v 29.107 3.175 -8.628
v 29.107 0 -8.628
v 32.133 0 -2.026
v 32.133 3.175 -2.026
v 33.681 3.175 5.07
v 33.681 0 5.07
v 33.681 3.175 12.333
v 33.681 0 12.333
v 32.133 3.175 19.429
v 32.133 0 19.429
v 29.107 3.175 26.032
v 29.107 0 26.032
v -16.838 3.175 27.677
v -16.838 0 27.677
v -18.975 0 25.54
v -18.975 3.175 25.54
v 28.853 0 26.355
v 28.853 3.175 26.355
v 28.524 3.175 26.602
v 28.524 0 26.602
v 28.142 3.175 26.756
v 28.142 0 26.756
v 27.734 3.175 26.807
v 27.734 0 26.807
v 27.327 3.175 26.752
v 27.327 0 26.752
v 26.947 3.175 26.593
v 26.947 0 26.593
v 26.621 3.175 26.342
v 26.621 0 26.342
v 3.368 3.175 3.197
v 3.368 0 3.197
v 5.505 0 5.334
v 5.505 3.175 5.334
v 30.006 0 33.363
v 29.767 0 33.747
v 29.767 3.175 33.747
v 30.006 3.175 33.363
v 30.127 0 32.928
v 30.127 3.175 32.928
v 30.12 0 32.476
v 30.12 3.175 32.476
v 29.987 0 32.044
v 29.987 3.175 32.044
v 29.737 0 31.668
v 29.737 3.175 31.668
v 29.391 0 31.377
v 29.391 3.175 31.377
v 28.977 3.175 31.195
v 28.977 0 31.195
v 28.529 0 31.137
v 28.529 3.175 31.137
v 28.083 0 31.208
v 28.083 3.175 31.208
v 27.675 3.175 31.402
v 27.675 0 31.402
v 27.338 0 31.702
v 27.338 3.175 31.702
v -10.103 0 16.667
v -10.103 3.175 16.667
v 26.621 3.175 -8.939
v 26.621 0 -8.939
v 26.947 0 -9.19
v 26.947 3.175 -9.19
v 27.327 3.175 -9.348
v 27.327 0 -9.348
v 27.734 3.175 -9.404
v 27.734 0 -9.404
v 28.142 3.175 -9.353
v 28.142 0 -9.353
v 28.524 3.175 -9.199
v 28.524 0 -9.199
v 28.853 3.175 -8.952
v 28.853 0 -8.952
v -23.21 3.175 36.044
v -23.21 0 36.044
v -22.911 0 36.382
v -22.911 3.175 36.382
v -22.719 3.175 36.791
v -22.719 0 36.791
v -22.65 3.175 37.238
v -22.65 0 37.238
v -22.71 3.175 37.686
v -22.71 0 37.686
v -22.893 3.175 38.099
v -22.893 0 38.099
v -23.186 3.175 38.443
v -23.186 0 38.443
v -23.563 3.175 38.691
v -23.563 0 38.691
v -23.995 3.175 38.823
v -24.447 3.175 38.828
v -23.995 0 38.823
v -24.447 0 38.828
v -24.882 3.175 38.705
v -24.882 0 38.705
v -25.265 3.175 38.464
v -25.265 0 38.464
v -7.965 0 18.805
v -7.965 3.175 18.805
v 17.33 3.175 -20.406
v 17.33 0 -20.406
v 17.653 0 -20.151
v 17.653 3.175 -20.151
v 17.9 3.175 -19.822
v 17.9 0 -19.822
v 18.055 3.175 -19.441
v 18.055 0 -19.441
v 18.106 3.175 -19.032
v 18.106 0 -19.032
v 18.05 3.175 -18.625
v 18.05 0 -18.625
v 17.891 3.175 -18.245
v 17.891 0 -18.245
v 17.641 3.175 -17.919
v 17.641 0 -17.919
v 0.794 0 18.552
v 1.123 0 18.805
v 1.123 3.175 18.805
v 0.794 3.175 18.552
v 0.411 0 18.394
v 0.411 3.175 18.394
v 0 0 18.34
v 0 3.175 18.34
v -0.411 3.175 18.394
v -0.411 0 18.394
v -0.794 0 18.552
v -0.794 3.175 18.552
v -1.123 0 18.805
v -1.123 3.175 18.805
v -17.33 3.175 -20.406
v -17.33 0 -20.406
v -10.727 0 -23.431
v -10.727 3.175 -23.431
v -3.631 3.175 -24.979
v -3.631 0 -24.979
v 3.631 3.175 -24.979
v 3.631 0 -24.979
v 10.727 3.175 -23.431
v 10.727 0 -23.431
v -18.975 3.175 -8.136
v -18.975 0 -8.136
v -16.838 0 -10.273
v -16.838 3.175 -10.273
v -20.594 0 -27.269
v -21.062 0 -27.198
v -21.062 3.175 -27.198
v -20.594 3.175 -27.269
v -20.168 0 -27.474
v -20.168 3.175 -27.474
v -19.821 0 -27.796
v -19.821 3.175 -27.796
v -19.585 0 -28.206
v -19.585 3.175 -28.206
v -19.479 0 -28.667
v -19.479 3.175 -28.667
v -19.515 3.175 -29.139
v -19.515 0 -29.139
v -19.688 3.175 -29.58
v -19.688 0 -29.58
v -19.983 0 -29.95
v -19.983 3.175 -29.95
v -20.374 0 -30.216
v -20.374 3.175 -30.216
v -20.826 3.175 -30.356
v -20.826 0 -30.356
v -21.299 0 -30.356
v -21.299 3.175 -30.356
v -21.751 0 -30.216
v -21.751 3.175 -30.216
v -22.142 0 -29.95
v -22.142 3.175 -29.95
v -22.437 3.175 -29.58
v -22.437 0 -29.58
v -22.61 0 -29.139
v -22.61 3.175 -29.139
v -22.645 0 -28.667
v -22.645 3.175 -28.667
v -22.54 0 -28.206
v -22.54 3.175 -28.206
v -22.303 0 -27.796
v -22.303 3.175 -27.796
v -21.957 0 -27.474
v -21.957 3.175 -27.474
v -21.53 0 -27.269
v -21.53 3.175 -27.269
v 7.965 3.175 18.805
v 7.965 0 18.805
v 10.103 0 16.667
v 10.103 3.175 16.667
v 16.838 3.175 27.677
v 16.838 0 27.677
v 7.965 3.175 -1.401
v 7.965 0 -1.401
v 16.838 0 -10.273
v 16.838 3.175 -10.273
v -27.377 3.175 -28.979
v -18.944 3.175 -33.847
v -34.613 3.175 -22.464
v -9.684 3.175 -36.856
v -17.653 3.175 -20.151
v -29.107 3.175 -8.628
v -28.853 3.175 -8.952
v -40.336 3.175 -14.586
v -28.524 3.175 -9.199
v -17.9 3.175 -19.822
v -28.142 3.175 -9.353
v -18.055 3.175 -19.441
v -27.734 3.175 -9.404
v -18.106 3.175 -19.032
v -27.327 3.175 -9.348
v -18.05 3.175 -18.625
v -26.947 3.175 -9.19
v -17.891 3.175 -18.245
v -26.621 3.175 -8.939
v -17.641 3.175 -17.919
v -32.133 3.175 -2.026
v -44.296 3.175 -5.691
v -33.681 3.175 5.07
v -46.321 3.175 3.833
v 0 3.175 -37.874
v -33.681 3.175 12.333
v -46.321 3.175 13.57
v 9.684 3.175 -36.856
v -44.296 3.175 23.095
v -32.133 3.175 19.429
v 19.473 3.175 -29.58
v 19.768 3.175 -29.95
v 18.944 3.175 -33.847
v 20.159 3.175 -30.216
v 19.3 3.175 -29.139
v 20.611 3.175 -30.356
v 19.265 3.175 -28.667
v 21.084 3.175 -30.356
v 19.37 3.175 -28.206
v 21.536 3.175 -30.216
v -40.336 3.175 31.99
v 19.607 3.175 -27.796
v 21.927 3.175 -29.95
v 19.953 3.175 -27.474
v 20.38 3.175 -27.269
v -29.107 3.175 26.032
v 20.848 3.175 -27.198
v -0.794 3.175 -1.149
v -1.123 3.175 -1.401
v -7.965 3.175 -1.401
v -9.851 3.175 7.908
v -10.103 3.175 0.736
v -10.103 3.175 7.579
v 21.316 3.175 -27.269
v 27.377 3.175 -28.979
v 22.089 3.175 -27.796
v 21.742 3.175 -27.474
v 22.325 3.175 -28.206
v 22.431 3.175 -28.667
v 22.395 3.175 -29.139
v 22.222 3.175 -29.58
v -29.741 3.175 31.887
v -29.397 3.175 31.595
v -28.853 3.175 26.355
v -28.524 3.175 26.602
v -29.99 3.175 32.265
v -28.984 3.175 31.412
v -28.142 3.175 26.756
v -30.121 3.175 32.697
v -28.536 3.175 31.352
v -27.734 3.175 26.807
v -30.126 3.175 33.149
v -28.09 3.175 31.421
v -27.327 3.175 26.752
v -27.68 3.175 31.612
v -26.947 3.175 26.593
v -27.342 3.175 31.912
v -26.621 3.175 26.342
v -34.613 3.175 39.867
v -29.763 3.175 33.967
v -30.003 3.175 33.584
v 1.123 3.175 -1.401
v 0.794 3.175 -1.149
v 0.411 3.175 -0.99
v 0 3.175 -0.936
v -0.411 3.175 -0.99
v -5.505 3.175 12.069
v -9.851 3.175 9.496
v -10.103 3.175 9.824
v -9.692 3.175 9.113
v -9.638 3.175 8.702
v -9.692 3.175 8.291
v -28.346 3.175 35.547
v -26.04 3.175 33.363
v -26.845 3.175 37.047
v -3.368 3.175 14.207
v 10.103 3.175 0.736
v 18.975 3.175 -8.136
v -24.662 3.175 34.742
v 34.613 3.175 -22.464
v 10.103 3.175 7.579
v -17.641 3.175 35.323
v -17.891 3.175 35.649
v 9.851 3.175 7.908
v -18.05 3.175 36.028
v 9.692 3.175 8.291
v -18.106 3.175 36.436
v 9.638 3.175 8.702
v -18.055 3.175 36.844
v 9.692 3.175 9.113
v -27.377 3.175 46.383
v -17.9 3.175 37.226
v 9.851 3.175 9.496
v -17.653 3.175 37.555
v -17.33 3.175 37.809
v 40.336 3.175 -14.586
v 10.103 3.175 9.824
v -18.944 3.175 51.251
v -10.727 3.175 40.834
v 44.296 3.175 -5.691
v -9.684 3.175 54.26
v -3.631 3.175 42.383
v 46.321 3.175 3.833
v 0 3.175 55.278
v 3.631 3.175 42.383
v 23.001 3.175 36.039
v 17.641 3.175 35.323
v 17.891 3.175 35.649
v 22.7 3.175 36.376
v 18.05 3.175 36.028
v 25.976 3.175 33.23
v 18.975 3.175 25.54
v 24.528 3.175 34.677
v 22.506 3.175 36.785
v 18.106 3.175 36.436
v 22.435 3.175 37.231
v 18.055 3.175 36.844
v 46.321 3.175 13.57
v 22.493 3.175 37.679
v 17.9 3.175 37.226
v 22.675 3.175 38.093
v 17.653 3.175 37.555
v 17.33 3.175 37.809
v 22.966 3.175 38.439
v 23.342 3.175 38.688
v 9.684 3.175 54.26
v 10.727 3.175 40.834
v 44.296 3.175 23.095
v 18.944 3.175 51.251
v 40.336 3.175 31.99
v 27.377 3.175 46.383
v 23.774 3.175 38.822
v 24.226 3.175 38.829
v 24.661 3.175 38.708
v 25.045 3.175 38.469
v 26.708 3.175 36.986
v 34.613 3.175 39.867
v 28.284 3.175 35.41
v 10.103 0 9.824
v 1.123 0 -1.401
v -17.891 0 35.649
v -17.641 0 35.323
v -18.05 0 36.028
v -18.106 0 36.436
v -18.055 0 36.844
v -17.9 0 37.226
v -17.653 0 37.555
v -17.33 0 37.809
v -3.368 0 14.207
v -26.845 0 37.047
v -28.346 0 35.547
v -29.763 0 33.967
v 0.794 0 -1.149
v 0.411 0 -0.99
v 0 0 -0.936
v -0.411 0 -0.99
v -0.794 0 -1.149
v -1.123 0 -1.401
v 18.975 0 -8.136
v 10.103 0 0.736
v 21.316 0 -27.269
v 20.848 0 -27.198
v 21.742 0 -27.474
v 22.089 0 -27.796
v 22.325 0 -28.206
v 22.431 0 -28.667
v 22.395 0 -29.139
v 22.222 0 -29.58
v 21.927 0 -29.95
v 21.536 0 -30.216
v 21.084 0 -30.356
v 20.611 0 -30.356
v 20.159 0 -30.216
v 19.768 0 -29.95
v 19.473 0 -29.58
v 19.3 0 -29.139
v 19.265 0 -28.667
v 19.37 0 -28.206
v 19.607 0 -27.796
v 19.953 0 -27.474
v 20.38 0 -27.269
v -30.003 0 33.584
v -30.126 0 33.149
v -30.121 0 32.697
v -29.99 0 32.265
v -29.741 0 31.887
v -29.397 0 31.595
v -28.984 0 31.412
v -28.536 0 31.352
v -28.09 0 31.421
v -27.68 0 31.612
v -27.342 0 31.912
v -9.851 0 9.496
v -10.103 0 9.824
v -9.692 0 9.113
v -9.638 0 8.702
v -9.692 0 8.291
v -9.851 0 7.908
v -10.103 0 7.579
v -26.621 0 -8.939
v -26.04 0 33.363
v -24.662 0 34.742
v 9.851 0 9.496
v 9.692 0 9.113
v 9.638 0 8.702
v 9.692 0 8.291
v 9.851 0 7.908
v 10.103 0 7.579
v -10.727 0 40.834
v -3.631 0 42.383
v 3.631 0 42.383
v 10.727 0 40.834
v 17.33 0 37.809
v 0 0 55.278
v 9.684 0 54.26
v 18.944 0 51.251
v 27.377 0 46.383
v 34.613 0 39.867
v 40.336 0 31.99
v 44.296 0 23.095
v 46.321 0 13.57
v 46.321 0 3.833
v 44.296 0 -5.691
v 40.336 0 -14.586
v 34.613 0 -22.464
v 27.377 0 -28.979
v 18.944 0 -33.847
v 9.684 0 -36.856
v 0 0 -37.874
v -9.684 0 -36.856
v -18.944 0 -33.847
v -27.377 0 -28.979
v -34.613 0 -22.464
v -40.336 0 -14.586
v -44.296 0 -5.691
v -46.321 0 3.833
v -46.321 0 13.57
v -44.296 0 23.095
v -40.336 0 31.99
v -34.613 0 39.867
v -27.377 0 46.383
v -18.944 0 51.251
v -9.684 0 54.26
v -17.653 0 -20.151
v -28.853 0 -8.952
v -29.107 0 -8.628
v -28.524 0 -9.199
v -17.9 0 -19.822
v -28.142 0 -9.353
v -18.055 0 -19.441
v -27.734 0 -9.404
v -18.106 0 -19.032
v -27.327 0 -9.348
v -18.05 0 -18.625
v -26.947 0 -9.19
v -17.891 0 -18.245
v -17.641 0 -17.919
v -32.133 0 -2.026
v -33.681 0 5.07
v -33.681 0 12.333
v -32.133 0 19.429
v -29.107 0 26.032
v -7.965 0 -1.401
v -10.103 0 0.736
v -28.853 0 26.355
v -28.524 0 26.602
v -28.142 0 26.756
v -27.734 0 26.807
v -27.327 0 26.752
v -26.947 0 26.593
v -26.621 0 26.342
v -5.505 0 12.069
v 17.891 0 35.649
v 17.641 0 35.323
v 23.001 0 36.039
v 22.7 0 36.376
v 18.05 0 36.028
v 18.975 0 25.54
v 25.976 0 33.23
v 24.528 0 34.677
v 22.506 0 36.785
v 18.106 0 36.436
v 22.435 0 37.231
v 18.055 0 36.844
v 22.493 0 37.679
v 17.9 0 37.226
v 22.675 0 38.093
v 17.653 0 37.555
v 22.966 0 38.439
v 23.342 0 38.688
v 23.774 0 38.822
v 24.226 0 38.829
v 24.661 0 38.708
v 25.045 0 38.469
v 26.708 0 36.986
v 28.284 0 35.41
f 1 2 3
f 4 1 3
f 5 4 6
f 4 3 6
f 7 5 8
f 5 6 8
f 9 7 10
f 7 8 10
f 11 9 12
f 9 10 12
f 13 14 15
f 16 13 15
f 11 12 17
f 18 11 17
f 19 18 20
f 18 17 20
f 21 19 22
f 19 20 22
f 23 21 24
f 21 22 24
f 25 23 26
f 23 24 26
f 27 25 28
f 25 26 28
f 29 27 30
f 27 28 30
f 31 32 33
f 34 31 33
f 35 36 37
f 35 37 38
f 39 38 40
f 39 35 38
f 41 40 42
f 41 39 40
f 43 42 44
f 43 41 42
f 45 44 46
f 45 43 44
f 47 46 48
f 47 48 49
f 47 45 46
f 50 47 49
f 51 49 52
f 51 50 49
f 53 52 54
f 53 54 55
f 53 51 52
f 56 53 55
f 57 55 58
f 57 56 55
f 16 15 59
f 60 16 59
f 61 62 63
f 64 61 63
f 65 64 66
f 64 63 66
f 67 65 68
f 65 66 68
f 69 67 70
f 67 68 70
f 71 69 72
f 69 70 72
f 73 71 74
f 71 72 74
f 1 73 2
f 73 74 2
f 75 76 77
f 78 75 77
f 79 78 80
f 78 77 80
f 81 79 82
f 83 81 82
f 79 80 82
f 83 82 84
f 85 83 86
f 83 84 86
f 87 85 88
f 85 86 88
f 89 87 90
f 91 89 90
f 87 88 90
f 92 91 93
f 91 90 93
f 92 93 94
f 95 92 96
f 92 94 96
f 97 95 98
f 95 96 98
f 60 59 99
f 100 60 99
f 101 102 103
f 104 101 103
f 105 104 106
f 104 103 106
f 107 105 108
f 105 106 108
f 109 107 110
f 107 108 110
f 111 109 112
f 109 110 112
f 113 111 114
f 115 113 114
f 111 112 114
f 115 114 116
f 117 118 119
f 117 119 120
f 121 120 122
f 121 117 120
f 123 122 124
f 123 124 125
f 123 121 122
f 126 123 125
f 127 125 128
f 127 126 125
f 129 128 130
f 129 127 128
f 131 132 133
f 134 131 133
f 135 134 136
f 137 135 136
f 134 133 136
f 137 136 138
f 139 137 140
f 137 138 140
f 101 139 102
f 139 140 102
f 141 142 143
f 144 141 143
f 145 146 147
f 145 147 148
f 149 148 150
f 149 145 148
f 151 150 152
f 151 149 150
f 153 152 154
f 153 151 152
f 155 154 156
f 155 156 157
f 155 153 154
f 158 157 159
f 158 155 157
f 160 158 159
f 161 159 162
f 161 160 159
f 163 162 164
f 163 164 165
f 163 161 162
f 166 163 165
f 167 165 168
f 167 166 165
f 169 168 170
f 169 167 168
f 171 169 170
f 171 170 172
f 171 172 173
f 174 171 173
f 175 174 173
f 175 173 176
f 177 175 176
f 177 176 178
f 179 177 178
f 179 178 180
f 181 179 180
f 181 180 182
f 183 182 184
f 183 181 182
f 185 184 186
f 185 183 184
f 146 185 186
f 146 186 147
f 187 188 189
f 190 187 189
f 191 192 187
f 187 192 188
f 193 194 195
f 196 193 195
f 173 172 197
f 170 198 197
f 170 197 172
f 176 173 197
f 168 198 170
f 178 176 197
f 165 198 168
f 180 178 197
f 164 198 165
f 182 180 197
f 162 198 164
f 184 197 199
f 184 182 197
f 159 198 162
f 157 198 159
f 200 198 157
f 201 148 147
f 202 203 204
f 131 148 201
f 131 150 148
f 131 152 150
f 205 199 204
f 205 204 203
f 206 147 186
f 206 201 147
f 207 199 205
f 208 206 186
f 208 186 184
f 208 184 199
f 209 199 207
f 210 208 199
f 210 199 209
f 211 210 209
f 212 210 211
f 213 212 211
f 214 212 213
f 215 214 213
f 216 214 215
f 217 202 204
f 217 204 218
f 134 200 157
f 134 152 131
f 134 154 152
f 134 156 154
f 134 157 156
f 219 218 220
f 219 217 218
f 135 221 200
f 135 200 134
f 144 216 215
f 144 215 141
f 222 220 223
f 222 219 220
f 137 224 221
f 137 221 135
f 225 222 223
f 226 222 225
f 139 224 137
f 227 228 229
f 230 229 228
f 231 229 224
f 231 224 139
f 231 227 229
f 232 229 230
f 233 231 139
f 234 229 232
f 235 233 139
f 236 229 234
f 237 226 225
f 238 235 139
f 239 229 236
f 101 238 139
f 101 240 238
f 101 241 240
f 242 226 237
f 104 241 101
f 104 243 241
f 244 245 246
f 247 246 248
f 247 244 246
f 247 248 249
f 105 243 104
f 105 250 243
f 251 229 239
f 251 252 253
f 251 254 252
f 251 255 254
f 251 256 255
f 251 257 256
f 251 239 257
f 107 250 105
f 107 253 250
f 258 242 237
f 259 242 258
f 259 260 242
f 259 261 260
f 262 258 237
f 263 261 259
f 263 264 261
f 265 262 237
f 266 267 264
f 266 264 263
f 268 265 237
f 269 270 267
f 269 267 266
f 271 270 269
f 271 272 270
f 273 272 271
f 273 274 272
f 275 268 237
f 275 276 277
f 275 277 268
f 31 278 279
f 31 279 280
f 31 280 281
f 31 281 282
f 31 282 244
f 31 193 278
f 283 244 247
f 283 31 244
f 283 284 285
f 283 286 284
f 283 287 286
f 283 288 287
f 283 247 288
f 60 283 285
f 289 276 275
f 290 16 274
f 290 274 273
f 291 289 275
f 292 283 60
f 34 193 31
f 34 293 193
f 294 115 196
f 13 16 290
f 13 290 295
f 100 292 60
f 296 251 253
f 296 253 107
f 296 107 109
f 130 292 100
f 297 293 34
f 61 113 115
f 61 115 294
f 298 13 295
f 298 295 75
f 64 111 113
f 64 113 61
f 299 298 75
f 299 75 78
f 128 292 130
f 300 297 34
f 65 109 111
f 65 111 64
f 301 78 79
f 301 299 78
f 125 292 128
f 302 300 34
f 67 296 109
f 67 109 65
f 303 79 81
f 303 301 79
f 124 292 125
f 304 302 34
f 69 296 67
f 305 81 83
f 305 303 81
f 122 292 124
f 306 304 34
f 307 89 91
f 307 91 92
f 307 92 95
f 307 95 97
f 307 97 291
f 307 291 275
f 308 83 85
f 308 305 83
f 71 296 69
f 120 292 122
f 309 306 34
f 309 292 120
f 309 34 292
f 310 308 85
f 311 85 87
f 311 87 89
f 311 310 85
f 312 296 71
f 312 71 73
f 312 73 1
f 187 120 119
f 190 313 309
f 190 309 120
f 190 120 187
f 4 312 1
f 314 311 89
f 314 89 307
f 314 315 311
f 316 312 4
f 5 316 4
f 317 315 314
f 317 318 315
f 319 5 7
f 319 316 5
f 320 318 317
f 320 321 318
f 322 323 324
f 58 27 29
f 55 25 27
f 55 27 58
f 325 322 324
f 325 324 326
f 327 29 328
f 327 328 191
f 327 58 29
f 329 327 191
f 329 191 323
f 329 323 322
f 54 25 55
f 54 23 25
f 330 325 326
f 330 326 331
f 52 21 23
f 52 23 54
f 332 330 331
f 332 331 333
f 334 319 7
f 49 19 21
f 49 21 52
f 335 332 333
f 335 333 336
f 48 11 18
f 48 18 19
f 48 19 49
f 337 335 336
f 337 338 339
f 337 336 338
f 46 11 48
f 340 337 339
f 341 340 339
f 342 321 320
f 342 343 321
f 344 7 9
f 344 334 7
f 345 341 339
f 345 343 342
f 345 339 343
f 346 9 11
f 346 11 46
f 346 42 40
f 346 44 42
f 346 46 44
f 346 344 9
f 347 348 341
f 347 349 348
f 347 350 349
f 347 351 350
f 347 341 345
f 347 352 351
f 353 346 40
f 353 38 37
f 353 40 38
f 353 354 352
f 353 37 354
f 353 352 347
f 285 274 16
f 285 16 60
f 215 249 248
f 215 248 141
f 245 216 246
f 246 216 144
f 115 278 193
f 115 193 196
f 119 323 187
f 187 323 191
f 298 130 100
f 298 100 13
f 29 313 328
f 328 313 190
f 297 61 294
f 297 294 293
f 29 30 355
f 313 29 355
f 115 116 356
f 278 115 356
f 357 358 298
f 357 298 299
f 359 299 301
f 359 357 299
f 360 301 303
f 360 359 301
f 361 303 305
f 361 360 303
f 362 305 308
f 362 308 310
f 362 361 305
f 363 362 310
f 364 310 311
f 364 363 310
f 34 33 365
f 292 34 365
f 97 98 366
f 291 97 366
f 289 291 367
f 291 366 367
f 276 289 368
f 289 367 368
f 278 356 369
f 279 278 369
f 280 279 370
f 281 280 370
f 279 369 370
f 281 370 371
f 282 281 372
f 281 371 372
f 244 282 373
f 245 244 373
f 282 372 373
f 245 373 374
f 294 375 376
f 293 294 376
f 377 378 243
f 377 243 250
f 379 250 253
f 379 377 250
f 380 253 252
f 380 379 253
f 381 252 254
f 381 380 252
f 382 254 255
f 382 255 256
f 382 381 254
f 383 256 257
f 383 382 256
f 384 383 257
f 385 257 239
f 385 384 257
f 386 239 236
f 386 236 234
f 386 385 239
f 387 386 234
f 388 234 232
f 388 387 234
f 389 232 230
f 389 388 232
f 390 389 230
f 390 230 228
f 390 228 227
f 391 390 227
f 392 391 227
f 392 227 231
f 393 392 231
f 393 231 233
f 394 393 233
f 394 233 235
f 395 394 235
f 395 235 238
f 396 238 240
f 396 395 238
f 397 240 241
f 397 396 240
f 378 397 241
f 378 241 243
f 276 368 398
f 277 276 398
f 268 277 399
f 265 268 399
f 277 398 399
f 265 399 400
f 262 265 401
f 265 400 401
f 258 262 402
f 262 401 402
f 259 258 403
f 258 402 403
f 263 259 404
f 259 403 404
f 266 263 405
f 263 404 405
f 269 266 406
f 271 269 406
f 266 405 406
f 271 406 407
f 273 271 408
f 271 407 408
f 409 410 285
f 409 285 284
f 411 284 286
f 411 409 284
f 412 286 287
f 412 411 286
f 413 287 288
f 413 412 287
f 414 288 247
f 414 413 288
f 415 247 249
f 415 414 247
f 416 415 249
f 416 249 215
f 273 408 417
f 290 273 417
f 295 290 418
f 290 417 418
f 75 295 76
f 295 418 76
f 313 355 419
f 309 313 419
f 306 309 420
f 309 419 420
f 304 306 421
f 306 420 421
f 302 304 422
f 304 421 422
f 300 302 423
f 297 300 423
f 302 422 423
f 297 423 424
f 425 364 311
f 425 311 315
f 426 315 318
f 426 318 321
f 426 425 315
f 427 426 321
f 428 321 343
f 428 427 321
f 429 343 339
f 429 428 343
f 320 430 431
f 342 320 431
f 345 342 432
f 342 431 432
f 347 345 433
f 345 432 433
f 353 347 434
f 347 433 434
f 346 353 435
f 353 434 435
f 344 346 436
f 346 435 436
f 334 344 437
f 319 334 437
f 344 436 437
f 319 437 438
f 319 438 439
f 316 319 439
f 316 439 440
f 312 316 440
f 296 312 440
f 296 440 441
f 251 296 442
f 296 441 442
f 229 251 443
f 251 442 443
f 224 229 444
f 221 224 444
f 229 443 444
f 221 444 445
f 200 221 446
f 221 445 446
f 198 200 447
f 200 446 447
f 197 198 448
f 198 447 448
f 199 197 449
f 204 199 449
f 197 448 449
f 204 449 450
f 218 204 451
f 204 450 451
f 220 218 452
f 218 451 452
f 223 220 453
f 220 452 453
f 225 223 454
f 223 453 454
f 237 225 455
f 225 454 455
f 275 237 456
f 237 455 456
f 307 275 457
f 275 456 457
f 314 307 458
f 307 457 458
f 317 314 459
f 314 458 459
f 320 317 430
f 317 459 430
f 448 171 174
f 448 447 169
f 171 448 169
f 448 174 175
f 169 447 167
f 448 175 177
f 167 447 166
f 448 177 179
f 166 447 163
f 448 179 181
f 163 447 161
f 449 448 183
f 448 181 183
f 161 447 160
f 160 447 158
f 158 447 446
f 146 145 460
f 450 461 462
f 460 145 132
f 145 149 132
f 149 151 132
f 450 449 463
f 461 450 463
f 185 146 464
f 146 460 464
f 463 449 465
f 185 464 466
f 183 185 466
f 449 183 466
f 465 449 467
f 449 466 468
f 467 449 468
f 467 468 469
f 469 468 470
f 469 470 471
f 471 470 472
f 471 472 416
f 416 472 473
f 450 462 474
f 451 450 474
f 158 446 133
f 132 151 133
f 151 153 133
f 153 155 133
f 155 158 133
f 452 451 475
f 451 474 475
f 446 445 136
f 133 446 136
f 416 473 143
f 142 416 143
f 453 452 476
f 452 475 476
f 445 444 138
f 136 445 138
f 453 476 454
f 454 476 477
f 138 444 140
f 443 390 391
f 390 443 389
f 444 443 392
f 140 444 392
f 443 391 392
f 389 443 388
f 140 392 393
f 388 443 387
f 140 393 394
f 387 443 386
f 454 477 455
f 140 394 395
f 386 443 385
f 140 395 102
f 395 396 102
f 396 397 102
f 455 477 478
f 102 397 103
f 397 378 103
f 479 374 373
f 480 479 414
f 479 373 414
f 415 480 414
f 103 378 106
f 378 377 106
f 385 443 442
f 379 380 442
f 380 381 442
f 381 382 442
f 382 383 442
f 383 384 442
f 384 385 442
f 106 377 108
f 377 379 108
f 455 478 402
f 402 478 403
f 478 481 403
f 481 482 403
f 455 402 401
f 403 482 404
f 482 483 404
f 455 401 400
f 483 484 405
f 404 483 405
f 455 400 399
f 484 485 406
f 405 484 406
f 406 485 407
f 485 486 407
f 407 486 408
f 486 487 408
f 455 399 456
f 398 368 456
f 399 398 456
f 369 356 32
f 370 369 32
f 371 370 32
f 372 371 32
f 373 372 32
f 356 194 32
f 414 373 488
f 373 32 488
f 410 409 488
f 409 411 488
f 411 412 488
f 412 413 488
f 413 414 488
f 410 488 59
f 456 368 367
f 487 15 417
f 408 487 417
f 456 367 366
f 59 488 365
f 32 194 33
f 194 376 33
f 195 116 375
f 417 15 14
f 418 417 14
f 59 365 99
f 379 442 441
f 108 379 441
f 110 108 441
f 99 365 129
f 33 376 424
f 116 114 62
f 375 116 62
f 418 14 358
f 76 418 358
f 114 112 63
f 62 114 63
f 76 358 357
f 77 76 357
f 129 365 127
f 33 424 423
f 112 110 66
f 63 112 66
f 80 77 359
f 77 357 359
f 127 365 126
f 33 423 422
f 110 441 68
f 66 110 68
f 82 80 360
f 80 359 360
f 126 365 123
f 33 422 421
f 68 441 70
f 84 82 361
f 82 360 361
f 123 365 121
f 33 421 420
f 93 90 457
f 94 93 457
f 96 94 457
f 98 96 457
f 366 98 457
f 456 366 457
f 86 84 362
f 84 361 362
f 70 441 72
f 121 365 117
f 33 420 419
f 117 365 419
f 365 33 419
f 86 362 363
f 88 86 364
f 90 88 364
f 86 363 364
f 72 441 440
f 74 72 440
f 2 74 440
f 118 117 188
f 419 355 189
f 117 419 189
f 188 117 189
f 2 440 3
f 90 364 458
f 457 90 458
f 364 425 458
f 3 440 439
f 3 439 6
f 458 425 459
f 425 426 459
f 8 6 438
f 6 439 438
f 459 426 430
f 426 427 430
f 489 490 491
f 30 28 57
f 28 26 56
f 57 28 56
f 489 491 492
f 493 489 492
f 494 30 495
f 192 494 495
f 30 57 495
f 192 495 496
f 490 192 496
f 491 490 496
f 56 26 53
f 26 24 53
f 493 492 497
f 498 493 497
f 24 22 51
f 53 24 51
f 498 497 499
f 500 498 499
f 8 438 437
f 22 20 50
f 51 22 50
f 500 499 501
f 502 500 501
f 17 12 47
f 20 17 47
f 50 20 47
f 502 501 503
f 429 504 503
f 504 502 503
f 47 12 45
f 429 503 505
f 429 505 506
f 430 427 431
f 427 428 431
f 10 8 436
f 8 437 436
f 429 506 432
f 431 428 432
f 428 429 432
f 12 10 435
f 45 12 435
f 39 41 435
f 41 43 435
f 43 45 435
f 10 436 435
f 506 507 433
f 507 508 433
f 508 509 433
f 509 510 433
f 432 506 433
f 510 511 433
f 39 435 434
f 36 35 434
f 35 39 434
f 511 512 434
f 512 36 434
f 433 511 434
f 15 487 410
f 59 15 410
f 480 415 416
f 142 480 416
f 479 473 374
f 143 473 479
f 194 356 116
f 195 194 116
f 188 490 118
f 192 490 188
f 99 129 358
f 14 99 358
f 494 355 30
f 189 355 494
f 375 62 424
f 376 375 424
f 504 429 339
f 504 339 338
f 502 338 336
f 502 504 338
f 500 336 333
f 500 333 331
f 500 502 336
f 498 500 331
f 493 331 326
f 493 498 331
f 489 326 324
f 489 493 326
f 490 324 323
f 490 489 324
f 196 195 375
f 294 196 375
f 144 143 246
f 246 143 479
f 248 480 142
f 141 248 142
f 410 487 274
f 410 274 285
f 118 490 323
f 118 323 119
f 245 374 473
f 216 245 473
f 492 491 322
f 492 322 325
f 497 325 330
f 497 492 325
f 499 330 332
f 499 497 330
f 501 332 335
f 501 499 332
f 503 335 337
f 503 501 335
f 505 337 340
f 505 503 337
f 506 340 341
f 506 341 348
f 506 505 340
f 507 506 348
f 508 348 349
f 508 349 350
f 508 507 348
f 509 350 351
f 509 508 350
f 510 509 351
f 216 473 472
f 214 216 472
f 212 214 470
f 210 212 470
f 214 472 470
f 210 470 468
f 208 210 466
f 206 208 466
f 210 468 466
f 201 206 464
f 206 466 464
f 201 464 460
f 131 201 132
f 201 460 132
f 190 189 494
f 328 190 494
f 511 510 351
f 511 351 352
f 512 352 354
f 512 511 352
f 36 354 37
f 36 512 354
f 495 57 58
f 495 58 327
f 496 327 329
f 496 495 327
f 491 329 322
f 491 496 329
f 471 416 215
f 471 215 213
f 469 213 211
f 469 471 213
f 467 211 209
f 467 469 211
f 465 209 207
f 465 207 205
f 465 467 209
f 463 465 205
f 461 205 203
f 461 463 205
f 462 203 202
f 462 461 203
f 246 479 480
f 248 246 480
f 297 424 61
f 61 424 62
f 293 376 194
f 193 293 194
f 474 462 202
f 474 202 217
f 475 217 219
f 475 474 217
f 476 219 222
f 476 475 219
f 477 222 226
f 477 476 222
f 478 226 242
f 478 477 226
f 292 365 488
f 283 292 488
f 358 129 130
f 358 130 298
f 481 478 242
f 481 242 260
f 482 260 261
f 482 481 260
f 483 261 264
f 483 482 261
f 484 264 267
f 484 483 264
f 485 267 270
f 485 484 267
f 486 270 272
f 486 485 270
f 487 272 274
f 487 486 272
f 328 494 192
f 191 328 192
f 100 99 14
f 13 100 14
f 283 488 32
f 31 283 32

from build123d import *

# Parameters (mm, degrees)
SKETCH1_R           = 46.575911091
SKETCH1_R_2         = 1.5875
BOSS_EXTRUDE1_DEPTH = 3.175


with BuildPart() as part:
    # Sketch1 → Boss-Extrude1 (new body)
    with BuildSketch(Plane(origin=(0, 0, 0), x_dir=(1, 0, 0), z_dir=(0, 1, 0))):
        with Locations(Location((-1e-09, -8.701819906, 0), (0, 0, 270))):
            Circle(SKETCH1_R)
        with Locations(Location((-21.062340002, 28.785905516, 0), (0, 0, 270))):
            Circle(SKETCH1_R_2, mode=Mode.SUBTRACT)
        with Locations(Location((20.847659998, 28.785905516, 0), (0, 0, 270))):
            Circle(SKETCH1_R_2, mode=Mode.SUBTRACT)
        with BuildLine():
            Line((17.640592508, -35.322668494), (1.122532008, -18.804607993))
            ThreePointArc((1.122532008, -18.804607993), (-8e-09, -18.339640008), (-1.122532023, -18.804607993))
            Line((-1.122532023, -18.804607993), (-17.640592542, -35.322668513))
            ThreePointArc((-17.640592542, -35.322668513), (-18.093334403, -36.641843516), (-17.330191572, -37.809238437))
            ThreePointArc((-17.330191572, -37.809238437), (-1.3e-08, -42.577730996), (17.330191539, -37.809238417))
            ThreePointArc((17.330191539, -37.809238417), (18.09333437, -36.641843496), (17.640592508, -35.322668494))
        make_face(mode=Mode.SUBTRACT)
        Polygon((-18.9752812, 8.136160364), (-16.837980243, 10.27346132), (-7.965487196, 1.400968273), (-10.102788153, -0.736332684), align=None, mode=Mode.SUBTRACT)
        with BuildLine():
            Line((26.620848619, -26.342412348), (10.102788136, -9.824351865))
            ThreePointArc((10.102788136, -9.824351865), (9.637820151, -8.70181985), (10.102788136, -7.579287835))
            Line((10.102788136, -7.579287835), (26.620848586, 8.938772615))
            ThreePointArc((26.620848586, 8.938772615), (27.940023589, 9.391514476), (29.107418509, 8.628371644))
            ThreePointArc((29.107418509, 8.628371644), (33.875911069, -8.70181986), (29.107418545, -26.032011374))
            ThreePointArc((29.107418545, -26.032011374), (27.940023624, -26.795154209), (26.620848619, -26.342412348))
        make_face(mode=Mode.SUBTRACT)
        with BuildLine():
            Line((-26.620848661, -26.342412387), (-10.102788145, -9.824351871))
            ThreePointArc((-10.102788145, -9.824351871), (-9.63782016, -8.701819856), (-10.102788145, -7.579287841))
            Line((-10.102788145, -7.579287841), (-26.620848632, 8.938772647))
            ThreePointArc((-26.620848632, 8.938772647), (-27.940023635, 9.391514508), (-29.107418555, 8.628371678))
            ThreePointArc((-29.107418555, 8.628371678), (-33.875911135, -8.701819865), (-29.107418586, -26.032011416))
            ThreePointArc((-29.107418586, -26.032011416), (-27.940023665, -26.795154248), (-26.620848661, -26.342412387))
        make_face(mode=Mode.SUBTRACT)
        Polygon((-18.975281171, -25.539800119), (-10.102788124, -16.667307072), (-7.965487167, -18.804608029), (-16.837980215, -27.677101076), align=None, mode=Mode.SUBTRACT)
        Polygon((-5.504897018, -12.069415894), (3.367596037, -3.196922839), (5.504896994, -5.334223796), (-3.367596061, -14.206716851), align=None, mode=Mode.SUBTRACT)
        Polygon((7.965487156, 1.40096828), (16.837980204, 10.273461327), (18.975281161, 8.13616037), (10.102788113, -0.736332677), align=None, mode=Mode.SUBTRACT)
        Polygon((7.965487164, -18.804608029), (10.102788121, -16.667307072), (18.975281169, -25.539800119), (16.837980212, -27.677101076), align=None, mode=Mode.SUBTRACT)
        with BuildLine():
            Line((-1.122532017, 1.400968288), (-17.640592486, 17.919028757))
            ThreePointArc((-17.640592486, 17.919028757), (-18.093334347, 19.238203762), (-17.330191513, 20.405598683))
            ThreePointArc((-17.330191513, 20.405598683), (-9e-09, 25.174091207), (17.330191488, 20.405598658))
            ThreePointArc((17.330191488, 20.405598658), (18.093334321, 19.238203738), (17.64059246, 17.919028734))
            Line((17.64059246, 17.919028734), (1.122532014, 1.400968288))
            ThreePointArc((1.122532014, 1.400968288), (-1e-09, 0.936000303), (-1.122532017, 1.400968288))
        make_face(mode=Mode.SUBTRACT)
        with BuildLine():
            ThreePointArc((-29.762524278, -33.966511802), (-29.579626476, -31.728910208), (-27.342024882, -31.911808011))
            ThreePointArc((-27.342024882, -31.911808011), (-25.360302369, -34.062122274), (-23.209988106, -36.043844786))
            ThreePointArc((-23.209988106, -36.043844786), (-23.027090304, -38.28144638), (-25.264691898, -38.464344183))
            ThreePointArc((-25.264691898, -38.464344183), (-27.605366399, -36.307186304), (-29.762524278, -33.966511802))
        make_face(mode=Mode.SUBTRACT)
        with BuildLine():
            ThreePointArc((23.000626318, -36.039350311), (22.807915825, -38.276128165), (25.044693679, -38.468838657))
            ThreePointArc((25.044693679, -38.468838657), (27.507381615, -36.209201522), (29.767018749, -33.746513584))
            ThreePointArc((29.767018749, -33.746513584), (29.574308255, -31.509735732), (27.337530403, -31.702446226))
            ThreePointArc((27.337530403, -31.702446226), (25.262317586, -33.964137493), (23.000626318, -36.039350311))
        make_face(mode=Mode.SUBTRACT)
    extrude(amount=BOSS_EXTRUDE1_DEPTH)


solid = part.part
